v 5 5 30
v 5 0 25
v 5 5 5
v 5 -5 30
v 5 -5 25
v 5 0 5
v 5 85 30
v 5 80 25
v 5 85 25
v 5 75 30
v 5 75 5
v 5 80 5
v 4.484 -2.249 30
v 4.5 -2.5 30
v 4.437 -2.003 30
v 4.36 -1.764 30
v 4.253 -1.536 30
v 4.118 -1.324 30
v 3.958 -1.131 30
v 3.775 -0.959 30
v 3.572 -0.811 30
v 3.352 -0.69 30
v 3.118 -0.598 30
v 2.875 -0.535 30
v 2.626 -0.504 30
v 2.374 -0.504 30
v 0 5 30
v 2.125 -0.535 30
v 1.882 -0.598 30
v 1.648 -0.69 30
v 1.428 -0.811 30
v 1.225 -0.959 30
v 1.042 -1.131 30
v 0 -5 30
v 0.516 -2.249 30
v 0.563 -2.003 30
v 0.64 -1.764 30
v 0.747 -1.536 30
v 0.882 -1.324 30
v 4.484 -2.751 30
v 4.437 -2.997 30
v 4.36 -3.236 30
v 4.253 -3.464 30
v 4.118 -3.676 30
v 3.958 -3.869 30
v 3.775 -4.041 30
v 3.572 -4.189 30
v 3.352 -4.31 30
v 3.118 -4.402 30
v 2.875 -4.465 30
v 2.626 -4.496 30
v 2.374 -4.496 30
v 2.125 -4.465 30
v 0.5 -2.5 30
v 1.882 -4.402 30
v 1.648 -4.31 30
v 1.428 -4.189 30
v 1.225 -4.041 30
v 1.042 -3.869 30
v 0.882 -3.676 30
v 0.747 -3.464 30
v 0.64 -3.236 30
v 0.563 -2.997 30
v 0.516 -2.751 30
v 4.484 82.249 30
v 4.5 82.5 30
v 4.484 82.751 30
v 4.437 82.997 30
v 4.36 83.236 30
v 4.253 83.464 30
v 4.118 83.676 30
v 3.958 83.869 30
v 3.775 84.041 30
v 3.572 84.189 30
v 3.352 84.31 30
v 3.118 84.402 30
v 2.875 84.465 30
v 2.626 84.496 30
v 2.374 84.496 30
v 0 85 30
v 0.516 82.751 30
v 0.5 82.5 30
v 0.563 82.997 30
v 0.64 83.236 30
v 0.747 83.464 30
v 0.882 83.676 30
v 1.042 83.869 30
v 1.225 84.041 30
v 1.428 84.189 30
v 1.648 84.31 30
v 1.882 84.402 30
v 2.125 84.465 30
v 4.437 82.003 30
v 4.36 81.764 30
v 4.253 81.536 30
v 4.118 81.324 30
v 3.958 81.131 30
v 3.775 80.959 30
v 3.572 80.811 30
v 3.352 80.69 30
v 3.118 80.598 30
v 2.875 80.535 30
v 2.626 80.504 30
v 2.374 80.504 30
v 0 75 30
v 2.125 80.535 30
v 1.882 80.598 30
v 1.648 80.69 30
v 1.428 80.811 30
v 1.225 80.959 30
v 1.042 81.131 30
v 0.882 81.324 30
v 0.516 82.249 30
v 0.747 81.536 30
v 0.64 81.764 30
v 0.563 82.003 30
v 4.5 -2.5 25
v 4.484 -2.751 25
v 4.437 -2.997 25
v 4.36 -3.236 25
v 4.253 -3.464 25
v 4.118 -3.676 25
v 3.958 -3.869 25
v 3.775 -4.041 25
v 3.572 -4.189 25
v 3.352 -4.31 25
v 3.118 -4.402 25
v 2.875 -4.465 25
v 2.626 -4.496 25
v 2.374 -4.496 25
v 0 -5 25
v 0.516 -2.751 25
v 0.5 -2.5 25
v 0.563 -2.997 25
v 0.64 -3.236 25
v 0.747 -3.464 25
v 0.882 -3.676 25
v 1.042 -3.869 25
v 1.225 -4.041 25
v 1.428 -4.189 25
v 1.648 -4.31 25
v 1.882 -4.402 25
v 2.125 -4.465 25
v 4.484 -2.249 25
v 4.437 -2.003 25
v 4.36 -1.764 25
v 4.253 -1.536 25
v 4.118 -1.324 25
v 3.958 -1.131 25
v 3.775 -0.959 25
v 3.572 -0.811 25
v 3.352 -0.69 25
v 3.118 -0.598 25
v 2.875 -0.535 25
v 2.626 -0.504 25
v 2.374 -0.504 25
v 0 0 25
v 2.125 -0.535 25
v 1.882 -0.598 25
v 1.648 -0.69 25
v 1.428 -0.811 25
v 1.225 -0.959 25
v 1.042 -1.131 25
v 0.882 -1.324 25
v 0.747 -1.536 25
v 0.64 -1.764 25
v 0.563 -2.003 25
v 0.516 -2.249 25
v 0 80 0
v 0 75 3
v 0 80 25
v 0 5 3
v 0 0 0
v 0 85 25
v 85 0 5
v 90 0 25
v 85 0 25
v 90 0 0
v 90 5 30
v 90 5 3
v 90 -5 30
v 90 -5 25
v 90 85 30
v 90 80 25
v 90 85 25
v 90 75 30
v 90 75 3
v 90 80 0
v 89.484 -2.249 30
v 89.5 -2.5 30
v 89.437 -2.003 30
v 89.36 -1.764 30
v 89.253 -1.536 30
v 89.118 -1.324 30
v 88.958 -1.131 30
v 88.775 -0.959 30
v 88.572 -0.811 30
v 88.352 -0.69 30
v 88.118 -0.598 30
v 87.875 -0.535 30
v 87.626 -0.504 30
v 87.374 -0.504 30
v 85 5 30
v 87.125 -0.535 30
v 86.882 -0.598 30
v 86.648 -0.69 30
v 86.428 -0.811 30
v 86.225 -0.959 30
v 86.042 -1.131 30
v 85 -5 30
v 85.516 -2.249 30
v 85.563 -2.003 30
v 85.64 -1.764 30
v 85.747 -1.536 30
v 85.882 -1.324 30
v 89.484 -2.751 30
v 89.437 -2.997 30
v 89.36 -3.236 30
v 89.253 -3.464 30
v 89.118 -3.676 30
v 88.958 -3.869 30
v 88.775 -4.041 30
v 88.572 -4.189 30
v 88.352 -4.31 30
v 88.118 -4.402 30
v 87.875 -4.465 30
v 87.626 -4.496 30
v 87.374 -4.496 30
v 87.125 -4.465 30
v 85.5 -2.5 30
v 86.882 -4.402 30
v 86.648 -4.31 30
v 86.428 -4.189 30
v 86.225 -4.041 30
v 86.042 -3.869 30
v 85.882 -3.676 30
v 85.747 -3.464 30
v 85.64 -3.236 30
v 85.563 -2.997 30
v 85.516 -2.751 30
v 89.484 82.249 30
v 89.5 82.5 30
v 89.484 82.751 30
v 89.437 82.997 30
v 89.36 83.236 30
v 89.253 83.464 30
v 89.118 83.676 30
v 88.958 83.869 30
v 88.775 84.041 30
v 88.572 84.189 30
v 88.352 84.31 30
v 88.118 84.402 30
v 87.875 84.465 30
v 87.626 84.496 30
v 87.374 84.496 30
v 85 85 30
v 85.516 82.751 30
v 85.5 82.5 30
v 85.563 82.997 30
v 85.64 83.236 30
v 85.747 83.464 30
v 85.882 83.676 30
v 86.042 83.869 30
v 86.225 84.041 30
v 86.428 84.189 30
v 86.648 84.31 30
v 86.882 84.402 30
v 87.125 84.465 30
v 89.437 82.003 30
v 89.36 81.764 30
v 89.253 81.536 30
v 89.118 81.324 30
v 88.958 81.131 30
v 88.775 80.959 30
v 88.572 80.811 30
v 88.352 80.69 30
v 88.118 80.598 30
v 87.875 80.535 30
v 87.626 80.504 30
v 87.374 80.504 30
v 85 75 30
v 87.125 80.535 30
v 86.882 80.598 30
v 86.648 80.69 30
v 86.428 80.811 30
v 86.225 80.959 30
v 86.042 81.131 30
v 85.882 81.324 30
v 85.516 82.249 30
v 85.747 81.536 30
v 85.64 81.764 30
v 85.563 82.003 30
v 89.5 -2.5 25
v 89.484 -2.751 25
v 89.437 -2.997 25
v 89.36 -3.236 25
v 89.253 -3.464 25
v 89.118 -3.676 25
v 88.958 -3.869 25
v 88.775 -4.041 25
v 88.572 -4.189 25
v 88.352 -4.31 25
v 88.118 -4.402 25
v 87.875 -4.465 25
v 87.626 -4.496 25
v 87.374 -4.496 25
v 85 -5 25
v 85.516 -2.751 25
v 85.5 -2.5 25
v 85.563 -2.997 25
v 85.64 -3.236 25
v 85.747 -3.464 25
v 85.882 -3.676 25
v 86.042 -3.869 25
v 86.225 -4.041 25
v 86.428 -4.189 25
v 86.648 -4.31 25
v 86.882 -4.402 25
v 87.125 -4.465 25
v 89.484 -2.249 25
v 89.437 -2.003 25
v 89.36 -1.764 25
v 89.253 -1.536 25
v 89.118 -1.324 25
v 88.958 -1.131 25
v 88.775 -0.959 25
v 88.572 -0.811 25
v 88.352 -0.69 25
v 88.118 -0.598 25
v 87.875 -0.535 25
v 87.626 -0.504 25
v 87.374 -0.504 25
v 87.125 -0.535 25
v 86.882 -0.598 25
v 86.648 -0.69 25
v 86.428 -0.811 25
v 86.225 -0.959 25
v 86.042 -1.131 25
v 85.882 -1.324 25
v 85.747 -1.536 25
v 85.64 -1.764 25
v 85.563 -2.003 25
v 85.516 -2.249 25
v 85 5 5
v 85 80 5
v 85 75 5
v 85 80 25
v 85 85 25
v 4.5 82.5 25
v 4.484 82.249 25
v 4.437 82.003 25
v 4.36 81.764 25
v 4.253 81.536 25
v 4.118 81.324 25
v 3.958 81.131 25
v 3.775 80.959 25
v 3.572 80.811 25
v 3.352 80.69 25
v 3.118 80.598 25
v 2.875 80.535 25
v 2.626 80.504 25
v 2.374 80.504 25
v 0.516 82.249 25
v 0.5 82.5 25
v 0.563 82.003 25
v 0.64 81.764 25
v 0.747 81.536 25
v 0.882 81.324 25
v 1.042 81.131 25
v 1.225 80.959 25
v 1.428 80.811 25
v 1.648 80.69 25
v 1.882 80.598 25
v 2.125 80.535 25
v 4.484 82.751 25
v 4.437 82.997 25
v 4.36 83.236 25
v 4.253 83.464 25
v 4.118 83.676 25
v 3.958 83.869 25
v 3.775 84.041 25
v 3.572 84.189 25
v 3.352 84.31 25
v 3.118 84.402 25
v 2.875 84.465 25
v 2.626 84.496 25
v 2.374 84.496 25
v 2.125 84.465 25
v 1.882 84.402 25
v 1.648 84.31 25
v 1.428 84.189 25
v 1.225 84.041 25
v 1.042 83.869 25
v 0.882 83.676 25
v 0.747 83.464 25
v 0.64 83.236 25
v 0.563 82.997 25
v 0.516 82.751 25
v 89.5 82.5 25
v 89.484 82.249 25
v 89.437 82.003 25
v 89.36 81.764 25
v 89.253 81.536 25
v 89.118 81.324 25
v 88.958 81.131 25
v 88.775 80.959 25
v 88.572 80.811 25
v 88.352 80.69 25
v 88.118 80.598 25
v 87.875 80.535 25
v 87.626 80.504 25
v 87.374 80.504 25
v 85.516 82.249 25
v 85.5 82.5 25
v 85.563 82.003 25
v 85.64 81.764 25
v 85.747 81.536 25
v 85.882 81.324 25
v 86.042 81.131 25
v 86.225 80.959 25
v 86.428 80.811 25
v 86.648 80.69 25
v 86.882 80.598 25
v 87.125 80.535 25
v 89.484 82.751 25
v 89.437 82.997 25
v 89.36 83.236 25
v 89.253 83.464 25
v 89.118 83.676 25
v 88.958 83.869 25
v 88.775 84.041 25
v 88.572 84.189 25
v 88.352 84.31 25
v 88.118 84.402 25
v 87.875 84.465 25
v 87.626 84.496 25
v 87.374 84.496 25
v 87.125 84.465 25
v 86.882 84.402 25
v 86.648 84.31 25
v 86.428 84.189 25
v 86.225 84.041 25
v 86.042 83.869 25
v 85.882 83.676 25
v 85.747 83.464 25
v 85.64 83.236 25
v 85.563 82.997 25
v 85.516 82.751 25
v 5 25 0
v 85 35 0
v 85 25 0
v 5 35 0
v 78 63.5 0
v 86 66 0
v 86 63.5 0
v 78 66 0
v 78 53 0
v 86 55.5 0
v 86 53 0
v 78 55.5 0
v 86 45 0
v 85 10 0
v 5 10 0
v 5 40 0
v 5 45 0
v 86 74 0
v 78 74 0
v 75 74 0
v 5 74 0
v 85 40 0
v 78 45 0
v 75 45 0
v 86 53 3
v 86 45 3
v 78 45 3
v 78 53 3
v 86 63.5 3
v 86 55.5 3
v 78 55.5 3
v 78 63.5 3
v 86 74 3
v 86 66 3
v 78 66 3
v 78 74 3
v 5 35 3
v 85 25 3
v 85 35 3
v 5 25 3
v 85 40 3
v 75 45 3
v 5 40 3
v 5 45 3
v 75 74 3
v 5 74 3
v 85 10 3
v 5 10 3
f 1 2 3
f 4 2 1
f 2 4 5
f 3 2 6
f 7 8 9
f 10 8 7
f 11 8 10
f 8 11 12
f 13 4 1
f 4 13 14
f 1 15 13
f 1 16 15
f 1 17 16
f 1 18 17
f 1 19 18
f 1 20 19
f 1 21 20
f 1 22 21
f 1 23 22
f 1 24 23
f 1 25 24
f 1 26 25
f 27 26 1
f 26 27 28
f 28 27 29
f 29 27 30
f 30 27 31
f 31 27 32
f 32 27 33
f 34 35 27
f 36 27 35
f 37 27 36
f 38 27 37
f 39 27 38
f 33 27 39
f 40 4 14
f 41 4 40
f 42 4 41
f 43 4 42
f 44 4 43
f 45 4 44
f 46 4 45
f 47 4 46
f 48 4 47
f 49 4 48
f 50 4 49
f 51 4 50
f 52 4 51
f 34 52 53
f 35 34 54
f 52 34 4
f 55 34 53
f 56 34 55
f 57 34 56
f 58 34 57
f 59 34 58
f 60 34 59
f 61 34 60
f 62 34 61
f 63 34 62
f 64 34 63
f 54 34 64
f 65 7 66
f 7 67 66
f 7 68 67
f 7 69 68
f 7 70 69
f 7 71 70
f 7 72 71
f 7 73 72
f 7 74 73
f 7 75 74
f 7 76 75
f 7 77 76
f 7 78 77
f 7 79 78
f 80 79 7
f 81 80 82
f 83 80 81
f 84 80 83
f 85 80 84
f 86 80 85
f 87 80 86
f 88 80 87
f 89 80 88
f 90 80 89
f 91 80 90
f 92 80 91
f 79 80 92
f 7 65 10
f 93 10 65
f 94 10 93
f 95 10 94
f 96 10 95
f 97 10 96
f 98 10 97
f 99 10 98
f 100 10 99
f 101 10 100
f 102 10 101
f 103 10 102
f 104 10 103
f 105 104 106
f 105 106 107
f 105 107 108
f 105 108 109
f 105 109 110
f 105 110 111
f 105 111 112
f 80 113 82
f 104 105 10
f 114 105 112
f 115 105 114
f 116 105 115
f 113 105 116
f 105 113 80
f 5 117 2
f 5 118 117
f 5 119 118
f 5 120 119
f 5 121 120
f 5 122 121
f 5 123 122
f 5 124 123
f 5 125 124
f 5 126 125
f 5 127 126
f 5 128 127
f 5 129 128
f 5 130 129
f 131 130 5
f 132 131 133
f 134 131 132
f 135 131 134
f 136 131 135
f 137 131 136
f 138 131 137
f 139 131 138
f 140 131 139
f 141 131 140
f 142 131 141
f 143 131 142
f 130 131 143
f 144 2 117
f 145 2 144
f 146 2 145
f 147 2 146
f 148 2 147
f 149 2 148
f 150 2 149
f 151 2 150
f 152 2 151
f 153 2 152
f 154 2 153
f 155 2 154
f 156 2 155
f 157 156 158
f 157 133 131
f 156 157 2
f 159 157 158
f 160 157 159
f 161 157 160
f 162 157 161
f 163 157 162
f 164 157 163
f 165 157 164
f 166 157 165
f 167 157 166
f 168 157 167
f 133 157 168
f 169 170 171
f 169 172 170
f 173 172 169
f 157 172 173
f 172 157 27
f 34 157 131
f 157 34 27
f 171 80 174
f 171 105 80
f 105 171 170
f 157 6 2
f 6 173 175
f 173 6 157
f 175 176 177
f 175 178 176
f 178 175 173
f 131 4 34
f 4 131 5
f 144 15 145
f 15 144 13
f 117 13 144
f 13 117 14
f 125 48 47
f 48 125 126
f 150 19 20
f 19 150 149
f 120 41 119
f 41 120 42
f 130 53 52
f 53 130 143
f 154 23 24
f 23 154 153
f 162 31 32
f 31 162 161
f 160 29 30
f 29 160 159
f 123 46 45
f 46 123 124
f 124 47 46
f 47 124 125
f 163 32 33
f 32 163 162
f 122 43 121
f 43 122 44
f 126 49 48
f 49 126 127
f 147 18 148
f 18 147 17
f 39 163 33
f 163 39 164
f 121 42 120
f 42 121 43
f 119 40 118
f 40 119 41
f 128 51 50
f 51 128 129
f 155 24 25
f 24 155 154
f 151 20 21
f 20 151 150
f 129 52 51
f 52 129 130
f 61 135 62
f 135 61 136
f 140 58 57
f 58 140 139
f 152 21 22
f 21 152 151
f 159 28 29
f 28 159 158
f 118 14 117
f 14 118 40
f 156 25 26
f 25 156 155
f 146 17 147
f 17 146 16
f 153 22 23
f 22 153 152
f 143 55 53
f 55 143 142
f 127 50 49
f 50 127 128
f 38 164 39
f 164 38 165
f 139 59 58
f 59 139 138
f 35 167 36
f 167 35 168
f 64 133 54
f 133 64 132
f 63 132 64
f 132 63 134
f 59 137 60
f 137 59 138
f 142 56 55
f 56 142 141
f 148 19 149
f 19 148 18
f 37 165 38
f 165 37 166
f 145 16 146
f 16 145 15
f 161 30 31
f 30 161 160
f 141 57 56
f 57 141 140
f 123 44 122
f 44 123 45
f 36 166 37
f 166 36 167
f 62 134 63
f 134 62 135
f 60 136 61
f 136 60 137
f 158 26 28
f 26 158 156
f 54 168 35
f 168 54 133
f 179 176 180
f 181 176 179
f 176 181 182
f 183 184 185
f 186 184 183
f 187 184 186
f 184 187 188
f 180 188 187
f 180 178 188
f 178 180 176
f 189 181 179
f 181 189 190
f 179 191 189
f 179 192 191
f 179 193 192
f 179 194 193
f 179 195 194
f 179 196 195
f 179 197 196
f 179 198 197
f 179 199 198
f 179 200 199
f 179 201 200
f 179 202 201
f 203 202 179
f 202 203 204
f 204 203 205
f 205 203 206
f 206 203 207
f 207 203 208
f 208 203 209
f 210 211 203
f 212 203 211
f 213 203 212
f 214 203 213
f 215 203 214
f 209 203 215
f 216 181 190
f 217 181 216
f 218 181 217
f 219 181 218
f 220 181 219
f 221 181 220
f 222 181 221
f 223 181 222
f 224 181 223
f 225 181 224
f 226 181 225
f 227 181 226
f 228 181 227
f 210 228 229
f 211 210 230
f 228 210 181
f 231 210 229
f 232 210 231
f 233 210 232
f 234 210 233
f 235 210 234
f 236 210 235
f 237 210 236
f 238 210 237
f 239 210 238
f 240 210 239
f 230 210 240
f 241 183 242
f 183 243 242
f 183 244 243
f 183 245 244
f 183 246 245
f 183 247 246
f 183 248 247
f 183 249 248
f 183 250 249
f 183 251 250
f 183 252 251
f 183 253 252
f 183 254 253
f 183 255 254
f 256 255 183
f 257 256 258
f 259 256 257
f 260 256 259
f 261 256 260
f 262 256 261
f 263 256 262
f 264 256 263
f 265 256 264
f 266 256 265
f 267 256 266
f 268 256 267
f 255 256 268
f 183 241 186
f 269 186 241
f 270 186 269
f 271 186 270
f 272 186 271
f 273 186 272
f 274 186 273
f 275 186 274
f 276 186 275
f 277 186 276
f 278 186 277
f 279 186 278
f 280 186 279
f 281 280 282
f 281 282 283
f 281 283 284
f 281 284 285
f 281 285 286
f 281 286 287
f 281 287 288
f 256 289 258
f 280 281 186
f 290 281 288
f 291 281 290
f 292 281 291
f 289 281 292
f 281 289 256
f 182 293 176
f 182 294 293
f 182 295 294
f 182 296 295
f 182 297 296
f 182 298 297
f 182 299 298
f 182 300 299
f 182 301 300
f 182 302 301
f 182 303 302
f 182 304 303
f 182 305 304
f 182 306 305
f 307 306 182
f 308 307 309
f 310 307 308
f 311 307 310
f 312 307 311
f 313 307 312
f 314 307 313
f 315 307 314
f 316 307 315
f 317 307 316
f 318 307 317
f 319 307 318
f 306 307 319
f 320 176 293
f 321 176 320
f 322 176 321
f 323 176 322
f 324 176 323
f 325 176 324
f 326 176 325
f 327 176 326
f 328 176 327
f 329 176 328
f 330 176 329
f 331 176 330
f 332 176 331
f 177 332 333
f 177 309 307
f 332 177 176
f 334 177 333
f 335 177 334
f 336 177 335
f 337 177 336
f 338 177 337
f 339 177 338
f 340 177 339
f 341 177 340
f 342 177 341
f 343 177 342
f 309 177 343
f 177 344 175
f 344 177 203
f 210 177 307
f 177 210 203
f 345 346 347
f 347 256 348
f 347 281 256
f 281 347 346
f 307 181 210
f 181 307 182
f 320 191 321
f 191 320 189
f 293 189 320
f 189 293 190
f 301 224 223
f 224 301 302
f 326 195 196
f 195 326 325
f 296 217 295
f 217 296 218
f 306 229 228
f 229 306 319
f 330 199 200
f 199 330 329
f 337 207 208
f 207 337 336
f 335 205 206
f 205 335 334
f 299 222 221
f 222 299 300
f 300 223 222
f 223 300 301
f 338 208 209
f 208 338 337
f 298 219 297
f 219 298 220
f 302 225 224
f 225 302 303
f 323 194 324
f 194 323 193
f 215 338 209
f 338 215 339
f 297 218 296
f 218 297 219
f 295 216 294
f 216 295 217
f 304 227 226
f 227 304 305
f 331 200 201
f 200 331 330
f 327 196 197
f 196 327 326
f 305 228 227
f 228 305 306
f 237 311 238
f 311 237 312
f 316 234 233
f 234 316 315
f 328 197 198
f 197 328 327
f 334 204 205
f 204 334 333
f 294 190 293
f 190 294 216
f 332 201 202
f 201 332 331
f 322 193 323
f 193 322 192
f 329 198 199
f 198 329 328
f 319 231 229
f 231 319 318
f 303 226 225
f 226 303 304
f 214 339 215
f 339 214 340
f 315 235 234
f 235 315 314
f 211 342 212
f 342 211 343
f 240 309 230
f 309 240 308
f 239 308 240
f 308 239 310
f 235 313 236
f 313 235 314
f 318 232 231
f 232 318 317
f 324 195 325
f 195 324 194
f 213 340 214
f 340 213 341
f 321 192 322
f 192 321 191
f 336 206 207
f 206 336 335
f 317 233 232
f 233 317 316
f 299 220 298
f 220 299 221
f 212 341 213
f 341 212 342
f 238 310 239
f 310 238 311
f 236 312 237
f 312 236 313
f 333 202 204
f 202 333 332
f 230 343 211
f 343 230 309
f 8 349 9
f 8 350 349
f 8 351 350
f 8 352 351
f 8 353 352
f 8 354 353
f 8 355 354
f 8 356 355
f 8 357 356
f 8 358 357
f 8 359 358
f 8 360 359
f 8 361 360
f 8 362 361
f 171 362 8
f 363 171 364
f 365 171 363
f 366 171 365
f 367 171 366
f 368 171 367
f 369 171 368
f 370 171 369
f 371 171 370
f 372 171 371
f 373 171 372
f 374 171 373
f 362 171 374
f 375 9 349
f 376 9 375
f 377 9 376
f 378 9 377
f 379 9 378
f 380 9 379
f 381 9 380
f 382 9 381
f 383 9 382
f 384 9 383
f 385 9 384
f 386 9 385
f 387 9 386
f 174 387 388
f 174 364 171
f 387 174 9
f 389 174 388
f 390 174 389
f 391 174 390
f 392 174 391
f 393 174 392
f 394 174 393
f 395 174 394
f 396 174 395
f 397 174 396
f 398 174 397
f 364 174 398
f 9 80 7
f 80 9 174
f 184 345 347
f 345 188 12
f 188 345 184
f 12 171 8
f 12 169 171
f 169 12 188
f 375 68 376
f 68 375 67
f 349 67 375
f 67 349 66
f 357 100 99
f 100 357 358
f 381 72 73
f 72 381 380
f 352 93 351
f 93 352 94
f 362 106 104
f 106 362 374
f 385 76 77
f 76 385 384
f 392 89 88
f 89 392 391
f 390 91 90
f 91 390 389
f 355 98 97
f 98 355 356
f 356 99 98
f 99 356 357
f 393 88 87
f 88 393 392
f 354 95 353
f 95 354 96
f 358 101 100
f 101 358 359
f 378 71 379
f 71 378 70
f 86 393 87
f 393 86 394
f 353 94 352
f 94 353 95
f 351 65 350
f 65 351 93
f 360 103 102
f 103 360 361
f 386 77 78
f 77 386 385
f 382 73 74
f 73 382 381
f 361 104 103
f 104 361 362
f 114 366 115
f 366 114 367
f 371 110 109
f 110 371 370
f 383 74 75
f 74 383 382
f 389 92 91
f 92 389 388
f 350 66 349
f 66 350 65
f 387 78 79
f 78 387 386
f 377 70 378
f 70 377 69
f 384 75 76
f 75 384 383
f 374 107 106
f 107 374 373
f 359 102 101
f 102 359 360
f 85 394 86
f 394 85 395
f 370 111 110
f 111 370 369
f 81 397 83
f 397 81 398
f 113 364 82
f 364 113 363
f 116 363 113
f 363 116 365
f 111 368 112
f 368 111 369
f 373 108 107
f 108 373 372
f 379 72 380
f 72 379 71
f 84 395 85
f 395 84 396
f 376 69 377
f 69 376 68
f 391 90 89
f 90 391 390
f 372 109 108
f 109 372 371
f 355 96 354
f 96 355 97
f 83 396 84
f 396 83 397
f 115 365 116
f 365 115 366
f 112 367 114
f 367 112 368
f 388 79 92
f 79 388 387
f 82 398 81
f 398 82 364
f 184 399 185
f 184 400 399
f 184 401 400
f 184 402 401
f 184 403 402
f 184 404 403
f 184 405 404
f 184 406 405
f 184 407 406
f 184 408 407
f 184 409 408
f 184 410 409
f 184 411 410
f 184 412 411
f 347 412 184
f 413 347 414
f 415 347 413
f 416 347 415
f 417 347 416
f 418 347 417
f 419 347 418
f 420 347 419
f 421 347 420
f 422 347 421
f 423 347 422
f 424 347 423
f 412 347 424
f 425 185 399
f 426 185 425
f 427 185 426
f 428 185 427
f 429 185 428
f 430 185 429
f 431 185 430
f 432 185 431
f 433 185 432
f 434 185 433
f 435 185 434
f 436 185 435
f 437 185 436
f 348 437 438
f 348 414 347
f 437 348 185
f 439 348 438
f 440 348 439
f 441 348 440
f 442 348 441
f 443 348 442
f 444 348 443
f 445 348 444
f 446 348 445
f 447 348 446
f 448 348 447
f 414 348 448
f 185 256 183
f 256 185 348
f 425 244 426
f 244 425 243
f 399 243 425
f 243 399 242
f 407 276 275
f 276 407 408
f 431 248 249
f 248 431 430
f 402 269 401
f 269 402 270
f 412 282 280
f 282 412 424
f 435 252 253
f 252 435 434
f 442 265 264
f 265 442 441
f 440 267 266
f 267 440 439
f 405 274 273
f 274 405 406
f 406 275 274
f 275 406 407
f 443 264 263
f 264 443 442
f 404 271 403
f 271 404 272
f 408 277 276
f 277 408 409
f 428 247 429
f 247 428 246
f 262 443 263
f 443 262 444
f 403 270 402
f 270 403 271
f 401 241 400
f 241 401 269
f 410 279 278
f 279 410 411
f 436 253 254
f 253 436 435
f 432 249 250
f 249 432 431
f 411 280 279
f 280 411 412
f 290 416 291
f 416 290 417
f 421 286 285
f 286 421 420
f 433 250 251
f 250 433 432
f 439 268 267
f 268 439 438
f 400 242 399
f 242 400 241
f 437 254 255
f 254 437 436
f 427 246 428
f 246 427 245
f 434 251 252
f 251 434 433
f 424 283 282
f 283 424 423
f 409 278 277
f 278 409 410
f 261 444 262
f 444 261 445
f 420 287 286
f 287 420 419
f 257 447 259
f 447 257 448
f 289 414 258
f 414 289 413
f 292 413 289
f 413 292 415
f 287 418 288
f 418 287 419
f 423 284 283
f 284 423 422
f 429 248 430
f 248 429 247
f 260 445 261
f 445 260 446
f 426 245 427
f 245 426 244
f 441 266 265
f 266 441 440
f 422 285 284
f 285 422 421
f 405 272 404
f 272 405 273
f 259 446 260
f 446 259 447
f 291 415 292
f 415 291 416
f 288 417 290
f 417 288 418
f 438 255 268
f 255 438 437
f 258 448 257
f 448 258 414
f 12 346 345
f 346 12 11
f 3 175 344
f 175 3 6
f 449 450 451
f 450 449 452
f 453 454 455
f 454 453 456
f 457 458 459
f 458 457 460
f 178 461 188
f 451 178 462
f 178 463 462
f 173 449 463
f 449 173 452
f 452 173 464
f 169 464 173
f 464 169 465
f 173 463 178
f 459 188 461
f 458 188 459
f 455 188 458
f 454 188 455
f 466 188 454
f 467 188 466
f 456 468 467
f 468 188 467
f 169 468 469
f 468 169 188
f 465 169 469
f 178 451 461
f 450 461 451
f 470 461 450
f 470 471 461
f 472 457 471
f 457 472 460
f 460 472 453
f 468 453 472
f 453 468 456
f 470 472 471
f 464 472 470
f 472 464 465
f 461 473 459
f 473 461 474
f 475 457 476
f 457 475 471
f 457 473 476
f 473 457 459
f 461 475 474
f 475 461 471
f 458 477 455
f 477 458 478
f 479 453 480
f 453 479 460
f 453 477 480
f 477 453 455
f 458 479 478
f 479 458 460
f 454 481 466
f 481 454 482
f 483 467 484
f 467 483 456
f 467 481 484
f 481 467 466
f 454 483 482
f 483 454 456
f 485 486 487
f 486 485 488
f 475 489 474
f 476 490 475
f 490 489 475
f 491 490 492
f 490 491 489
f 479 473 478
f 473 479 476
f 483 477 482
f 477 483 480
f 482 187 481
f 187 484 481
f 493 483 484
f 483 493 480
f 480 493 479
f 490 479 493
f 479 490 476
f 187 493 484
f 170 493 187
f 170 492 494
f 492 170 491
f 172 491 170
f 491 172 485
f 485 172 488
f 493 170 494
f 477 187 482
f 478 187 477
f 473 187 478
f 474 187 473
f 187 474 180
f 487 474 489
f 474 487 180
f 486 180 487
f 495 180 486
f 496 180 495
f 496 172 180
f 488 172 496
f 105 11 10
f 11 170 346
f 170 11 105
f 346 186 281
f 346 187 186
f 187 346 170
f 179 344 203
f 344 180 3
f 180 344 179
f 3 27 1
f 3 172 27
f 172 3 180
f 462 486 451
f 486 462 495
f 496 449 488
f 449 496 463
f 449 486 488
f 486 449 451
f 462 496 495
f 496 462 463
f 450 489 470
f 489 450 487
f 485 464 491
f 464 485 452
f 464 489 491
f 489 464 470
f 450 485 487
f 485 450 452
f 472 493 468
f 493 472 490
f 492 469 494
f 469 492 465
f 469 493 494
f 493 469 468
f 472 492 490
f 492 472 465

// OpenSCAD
module feather_epd_screwhole() {
    difference() {
        union() {
            translate([0,-1,0]) {
                cube([5,3.5,1]);
            }
            translate([2.5,2.5,0]) {
                cylinder(h=1, d=5, center=false, $fn=50);
            }
        }
        translate([2.5,2.5,0]) {
            cylinder(h=3, d=4.5, center=true, $fn=50);
        }
    }
}

module feather_epd_footprint() {
    union() {
        cube([60, 30, 20]);
        translate([5,0,0]) rotate(180) {
            feather_epd_screwhole();
        }
        translate([60, 0, 0]) rotate(180) {
            feather_epd_screwhole();
        }
        translate([0,30,0]) {
            feather_epd_screwhole();
        }
        translate([55,30,0]) {
            feather_epd_screwhole();
        }
    }
}

module component_mount_screwhole() {
    difference() {
        cube([5,5,5]);
        translate([2.5,2.5,0]) {
            cylinder(d=4, h=12, center=true, $fn=50);
        }
    }
}

module button_mount_negative() {
    union() {
        cube([8,8,31]);
        cube([2,8,10]);
        translate([6,0,0]) cube([2,8,10]);
    }
}

module component_mount() {
    difference() {
        union() {
            cube([90,80, 5]); 
            cube([5,80,30]);
            translate([85,0,0]) cube([5,80,30]);
            translate([0,-5,25]) component_mount_screwhole();
            translate([85,-5,25]) component_mount_screwhole();
            translate([0,80,25]) component_mount_screwhole();
            translate([85,80,25]) component_mount_screwhole();
        }
        translate([-1,5,3]) cube([100, 70, 30]);
        translate([5,10,-1]) cube([80, 15, 10]);
        translate([5,35,-1]) cube([80, 5,10]);
        translate([5,45,-1]) cube([70, 29, 10]);
        translate([78,45,-1]) button_mount_negative(); 
        translate([78,55.5,-1]) button_mount_negative();
        translate([78,66,-1]) button_mount_negative();
    }
}


component_mount();
